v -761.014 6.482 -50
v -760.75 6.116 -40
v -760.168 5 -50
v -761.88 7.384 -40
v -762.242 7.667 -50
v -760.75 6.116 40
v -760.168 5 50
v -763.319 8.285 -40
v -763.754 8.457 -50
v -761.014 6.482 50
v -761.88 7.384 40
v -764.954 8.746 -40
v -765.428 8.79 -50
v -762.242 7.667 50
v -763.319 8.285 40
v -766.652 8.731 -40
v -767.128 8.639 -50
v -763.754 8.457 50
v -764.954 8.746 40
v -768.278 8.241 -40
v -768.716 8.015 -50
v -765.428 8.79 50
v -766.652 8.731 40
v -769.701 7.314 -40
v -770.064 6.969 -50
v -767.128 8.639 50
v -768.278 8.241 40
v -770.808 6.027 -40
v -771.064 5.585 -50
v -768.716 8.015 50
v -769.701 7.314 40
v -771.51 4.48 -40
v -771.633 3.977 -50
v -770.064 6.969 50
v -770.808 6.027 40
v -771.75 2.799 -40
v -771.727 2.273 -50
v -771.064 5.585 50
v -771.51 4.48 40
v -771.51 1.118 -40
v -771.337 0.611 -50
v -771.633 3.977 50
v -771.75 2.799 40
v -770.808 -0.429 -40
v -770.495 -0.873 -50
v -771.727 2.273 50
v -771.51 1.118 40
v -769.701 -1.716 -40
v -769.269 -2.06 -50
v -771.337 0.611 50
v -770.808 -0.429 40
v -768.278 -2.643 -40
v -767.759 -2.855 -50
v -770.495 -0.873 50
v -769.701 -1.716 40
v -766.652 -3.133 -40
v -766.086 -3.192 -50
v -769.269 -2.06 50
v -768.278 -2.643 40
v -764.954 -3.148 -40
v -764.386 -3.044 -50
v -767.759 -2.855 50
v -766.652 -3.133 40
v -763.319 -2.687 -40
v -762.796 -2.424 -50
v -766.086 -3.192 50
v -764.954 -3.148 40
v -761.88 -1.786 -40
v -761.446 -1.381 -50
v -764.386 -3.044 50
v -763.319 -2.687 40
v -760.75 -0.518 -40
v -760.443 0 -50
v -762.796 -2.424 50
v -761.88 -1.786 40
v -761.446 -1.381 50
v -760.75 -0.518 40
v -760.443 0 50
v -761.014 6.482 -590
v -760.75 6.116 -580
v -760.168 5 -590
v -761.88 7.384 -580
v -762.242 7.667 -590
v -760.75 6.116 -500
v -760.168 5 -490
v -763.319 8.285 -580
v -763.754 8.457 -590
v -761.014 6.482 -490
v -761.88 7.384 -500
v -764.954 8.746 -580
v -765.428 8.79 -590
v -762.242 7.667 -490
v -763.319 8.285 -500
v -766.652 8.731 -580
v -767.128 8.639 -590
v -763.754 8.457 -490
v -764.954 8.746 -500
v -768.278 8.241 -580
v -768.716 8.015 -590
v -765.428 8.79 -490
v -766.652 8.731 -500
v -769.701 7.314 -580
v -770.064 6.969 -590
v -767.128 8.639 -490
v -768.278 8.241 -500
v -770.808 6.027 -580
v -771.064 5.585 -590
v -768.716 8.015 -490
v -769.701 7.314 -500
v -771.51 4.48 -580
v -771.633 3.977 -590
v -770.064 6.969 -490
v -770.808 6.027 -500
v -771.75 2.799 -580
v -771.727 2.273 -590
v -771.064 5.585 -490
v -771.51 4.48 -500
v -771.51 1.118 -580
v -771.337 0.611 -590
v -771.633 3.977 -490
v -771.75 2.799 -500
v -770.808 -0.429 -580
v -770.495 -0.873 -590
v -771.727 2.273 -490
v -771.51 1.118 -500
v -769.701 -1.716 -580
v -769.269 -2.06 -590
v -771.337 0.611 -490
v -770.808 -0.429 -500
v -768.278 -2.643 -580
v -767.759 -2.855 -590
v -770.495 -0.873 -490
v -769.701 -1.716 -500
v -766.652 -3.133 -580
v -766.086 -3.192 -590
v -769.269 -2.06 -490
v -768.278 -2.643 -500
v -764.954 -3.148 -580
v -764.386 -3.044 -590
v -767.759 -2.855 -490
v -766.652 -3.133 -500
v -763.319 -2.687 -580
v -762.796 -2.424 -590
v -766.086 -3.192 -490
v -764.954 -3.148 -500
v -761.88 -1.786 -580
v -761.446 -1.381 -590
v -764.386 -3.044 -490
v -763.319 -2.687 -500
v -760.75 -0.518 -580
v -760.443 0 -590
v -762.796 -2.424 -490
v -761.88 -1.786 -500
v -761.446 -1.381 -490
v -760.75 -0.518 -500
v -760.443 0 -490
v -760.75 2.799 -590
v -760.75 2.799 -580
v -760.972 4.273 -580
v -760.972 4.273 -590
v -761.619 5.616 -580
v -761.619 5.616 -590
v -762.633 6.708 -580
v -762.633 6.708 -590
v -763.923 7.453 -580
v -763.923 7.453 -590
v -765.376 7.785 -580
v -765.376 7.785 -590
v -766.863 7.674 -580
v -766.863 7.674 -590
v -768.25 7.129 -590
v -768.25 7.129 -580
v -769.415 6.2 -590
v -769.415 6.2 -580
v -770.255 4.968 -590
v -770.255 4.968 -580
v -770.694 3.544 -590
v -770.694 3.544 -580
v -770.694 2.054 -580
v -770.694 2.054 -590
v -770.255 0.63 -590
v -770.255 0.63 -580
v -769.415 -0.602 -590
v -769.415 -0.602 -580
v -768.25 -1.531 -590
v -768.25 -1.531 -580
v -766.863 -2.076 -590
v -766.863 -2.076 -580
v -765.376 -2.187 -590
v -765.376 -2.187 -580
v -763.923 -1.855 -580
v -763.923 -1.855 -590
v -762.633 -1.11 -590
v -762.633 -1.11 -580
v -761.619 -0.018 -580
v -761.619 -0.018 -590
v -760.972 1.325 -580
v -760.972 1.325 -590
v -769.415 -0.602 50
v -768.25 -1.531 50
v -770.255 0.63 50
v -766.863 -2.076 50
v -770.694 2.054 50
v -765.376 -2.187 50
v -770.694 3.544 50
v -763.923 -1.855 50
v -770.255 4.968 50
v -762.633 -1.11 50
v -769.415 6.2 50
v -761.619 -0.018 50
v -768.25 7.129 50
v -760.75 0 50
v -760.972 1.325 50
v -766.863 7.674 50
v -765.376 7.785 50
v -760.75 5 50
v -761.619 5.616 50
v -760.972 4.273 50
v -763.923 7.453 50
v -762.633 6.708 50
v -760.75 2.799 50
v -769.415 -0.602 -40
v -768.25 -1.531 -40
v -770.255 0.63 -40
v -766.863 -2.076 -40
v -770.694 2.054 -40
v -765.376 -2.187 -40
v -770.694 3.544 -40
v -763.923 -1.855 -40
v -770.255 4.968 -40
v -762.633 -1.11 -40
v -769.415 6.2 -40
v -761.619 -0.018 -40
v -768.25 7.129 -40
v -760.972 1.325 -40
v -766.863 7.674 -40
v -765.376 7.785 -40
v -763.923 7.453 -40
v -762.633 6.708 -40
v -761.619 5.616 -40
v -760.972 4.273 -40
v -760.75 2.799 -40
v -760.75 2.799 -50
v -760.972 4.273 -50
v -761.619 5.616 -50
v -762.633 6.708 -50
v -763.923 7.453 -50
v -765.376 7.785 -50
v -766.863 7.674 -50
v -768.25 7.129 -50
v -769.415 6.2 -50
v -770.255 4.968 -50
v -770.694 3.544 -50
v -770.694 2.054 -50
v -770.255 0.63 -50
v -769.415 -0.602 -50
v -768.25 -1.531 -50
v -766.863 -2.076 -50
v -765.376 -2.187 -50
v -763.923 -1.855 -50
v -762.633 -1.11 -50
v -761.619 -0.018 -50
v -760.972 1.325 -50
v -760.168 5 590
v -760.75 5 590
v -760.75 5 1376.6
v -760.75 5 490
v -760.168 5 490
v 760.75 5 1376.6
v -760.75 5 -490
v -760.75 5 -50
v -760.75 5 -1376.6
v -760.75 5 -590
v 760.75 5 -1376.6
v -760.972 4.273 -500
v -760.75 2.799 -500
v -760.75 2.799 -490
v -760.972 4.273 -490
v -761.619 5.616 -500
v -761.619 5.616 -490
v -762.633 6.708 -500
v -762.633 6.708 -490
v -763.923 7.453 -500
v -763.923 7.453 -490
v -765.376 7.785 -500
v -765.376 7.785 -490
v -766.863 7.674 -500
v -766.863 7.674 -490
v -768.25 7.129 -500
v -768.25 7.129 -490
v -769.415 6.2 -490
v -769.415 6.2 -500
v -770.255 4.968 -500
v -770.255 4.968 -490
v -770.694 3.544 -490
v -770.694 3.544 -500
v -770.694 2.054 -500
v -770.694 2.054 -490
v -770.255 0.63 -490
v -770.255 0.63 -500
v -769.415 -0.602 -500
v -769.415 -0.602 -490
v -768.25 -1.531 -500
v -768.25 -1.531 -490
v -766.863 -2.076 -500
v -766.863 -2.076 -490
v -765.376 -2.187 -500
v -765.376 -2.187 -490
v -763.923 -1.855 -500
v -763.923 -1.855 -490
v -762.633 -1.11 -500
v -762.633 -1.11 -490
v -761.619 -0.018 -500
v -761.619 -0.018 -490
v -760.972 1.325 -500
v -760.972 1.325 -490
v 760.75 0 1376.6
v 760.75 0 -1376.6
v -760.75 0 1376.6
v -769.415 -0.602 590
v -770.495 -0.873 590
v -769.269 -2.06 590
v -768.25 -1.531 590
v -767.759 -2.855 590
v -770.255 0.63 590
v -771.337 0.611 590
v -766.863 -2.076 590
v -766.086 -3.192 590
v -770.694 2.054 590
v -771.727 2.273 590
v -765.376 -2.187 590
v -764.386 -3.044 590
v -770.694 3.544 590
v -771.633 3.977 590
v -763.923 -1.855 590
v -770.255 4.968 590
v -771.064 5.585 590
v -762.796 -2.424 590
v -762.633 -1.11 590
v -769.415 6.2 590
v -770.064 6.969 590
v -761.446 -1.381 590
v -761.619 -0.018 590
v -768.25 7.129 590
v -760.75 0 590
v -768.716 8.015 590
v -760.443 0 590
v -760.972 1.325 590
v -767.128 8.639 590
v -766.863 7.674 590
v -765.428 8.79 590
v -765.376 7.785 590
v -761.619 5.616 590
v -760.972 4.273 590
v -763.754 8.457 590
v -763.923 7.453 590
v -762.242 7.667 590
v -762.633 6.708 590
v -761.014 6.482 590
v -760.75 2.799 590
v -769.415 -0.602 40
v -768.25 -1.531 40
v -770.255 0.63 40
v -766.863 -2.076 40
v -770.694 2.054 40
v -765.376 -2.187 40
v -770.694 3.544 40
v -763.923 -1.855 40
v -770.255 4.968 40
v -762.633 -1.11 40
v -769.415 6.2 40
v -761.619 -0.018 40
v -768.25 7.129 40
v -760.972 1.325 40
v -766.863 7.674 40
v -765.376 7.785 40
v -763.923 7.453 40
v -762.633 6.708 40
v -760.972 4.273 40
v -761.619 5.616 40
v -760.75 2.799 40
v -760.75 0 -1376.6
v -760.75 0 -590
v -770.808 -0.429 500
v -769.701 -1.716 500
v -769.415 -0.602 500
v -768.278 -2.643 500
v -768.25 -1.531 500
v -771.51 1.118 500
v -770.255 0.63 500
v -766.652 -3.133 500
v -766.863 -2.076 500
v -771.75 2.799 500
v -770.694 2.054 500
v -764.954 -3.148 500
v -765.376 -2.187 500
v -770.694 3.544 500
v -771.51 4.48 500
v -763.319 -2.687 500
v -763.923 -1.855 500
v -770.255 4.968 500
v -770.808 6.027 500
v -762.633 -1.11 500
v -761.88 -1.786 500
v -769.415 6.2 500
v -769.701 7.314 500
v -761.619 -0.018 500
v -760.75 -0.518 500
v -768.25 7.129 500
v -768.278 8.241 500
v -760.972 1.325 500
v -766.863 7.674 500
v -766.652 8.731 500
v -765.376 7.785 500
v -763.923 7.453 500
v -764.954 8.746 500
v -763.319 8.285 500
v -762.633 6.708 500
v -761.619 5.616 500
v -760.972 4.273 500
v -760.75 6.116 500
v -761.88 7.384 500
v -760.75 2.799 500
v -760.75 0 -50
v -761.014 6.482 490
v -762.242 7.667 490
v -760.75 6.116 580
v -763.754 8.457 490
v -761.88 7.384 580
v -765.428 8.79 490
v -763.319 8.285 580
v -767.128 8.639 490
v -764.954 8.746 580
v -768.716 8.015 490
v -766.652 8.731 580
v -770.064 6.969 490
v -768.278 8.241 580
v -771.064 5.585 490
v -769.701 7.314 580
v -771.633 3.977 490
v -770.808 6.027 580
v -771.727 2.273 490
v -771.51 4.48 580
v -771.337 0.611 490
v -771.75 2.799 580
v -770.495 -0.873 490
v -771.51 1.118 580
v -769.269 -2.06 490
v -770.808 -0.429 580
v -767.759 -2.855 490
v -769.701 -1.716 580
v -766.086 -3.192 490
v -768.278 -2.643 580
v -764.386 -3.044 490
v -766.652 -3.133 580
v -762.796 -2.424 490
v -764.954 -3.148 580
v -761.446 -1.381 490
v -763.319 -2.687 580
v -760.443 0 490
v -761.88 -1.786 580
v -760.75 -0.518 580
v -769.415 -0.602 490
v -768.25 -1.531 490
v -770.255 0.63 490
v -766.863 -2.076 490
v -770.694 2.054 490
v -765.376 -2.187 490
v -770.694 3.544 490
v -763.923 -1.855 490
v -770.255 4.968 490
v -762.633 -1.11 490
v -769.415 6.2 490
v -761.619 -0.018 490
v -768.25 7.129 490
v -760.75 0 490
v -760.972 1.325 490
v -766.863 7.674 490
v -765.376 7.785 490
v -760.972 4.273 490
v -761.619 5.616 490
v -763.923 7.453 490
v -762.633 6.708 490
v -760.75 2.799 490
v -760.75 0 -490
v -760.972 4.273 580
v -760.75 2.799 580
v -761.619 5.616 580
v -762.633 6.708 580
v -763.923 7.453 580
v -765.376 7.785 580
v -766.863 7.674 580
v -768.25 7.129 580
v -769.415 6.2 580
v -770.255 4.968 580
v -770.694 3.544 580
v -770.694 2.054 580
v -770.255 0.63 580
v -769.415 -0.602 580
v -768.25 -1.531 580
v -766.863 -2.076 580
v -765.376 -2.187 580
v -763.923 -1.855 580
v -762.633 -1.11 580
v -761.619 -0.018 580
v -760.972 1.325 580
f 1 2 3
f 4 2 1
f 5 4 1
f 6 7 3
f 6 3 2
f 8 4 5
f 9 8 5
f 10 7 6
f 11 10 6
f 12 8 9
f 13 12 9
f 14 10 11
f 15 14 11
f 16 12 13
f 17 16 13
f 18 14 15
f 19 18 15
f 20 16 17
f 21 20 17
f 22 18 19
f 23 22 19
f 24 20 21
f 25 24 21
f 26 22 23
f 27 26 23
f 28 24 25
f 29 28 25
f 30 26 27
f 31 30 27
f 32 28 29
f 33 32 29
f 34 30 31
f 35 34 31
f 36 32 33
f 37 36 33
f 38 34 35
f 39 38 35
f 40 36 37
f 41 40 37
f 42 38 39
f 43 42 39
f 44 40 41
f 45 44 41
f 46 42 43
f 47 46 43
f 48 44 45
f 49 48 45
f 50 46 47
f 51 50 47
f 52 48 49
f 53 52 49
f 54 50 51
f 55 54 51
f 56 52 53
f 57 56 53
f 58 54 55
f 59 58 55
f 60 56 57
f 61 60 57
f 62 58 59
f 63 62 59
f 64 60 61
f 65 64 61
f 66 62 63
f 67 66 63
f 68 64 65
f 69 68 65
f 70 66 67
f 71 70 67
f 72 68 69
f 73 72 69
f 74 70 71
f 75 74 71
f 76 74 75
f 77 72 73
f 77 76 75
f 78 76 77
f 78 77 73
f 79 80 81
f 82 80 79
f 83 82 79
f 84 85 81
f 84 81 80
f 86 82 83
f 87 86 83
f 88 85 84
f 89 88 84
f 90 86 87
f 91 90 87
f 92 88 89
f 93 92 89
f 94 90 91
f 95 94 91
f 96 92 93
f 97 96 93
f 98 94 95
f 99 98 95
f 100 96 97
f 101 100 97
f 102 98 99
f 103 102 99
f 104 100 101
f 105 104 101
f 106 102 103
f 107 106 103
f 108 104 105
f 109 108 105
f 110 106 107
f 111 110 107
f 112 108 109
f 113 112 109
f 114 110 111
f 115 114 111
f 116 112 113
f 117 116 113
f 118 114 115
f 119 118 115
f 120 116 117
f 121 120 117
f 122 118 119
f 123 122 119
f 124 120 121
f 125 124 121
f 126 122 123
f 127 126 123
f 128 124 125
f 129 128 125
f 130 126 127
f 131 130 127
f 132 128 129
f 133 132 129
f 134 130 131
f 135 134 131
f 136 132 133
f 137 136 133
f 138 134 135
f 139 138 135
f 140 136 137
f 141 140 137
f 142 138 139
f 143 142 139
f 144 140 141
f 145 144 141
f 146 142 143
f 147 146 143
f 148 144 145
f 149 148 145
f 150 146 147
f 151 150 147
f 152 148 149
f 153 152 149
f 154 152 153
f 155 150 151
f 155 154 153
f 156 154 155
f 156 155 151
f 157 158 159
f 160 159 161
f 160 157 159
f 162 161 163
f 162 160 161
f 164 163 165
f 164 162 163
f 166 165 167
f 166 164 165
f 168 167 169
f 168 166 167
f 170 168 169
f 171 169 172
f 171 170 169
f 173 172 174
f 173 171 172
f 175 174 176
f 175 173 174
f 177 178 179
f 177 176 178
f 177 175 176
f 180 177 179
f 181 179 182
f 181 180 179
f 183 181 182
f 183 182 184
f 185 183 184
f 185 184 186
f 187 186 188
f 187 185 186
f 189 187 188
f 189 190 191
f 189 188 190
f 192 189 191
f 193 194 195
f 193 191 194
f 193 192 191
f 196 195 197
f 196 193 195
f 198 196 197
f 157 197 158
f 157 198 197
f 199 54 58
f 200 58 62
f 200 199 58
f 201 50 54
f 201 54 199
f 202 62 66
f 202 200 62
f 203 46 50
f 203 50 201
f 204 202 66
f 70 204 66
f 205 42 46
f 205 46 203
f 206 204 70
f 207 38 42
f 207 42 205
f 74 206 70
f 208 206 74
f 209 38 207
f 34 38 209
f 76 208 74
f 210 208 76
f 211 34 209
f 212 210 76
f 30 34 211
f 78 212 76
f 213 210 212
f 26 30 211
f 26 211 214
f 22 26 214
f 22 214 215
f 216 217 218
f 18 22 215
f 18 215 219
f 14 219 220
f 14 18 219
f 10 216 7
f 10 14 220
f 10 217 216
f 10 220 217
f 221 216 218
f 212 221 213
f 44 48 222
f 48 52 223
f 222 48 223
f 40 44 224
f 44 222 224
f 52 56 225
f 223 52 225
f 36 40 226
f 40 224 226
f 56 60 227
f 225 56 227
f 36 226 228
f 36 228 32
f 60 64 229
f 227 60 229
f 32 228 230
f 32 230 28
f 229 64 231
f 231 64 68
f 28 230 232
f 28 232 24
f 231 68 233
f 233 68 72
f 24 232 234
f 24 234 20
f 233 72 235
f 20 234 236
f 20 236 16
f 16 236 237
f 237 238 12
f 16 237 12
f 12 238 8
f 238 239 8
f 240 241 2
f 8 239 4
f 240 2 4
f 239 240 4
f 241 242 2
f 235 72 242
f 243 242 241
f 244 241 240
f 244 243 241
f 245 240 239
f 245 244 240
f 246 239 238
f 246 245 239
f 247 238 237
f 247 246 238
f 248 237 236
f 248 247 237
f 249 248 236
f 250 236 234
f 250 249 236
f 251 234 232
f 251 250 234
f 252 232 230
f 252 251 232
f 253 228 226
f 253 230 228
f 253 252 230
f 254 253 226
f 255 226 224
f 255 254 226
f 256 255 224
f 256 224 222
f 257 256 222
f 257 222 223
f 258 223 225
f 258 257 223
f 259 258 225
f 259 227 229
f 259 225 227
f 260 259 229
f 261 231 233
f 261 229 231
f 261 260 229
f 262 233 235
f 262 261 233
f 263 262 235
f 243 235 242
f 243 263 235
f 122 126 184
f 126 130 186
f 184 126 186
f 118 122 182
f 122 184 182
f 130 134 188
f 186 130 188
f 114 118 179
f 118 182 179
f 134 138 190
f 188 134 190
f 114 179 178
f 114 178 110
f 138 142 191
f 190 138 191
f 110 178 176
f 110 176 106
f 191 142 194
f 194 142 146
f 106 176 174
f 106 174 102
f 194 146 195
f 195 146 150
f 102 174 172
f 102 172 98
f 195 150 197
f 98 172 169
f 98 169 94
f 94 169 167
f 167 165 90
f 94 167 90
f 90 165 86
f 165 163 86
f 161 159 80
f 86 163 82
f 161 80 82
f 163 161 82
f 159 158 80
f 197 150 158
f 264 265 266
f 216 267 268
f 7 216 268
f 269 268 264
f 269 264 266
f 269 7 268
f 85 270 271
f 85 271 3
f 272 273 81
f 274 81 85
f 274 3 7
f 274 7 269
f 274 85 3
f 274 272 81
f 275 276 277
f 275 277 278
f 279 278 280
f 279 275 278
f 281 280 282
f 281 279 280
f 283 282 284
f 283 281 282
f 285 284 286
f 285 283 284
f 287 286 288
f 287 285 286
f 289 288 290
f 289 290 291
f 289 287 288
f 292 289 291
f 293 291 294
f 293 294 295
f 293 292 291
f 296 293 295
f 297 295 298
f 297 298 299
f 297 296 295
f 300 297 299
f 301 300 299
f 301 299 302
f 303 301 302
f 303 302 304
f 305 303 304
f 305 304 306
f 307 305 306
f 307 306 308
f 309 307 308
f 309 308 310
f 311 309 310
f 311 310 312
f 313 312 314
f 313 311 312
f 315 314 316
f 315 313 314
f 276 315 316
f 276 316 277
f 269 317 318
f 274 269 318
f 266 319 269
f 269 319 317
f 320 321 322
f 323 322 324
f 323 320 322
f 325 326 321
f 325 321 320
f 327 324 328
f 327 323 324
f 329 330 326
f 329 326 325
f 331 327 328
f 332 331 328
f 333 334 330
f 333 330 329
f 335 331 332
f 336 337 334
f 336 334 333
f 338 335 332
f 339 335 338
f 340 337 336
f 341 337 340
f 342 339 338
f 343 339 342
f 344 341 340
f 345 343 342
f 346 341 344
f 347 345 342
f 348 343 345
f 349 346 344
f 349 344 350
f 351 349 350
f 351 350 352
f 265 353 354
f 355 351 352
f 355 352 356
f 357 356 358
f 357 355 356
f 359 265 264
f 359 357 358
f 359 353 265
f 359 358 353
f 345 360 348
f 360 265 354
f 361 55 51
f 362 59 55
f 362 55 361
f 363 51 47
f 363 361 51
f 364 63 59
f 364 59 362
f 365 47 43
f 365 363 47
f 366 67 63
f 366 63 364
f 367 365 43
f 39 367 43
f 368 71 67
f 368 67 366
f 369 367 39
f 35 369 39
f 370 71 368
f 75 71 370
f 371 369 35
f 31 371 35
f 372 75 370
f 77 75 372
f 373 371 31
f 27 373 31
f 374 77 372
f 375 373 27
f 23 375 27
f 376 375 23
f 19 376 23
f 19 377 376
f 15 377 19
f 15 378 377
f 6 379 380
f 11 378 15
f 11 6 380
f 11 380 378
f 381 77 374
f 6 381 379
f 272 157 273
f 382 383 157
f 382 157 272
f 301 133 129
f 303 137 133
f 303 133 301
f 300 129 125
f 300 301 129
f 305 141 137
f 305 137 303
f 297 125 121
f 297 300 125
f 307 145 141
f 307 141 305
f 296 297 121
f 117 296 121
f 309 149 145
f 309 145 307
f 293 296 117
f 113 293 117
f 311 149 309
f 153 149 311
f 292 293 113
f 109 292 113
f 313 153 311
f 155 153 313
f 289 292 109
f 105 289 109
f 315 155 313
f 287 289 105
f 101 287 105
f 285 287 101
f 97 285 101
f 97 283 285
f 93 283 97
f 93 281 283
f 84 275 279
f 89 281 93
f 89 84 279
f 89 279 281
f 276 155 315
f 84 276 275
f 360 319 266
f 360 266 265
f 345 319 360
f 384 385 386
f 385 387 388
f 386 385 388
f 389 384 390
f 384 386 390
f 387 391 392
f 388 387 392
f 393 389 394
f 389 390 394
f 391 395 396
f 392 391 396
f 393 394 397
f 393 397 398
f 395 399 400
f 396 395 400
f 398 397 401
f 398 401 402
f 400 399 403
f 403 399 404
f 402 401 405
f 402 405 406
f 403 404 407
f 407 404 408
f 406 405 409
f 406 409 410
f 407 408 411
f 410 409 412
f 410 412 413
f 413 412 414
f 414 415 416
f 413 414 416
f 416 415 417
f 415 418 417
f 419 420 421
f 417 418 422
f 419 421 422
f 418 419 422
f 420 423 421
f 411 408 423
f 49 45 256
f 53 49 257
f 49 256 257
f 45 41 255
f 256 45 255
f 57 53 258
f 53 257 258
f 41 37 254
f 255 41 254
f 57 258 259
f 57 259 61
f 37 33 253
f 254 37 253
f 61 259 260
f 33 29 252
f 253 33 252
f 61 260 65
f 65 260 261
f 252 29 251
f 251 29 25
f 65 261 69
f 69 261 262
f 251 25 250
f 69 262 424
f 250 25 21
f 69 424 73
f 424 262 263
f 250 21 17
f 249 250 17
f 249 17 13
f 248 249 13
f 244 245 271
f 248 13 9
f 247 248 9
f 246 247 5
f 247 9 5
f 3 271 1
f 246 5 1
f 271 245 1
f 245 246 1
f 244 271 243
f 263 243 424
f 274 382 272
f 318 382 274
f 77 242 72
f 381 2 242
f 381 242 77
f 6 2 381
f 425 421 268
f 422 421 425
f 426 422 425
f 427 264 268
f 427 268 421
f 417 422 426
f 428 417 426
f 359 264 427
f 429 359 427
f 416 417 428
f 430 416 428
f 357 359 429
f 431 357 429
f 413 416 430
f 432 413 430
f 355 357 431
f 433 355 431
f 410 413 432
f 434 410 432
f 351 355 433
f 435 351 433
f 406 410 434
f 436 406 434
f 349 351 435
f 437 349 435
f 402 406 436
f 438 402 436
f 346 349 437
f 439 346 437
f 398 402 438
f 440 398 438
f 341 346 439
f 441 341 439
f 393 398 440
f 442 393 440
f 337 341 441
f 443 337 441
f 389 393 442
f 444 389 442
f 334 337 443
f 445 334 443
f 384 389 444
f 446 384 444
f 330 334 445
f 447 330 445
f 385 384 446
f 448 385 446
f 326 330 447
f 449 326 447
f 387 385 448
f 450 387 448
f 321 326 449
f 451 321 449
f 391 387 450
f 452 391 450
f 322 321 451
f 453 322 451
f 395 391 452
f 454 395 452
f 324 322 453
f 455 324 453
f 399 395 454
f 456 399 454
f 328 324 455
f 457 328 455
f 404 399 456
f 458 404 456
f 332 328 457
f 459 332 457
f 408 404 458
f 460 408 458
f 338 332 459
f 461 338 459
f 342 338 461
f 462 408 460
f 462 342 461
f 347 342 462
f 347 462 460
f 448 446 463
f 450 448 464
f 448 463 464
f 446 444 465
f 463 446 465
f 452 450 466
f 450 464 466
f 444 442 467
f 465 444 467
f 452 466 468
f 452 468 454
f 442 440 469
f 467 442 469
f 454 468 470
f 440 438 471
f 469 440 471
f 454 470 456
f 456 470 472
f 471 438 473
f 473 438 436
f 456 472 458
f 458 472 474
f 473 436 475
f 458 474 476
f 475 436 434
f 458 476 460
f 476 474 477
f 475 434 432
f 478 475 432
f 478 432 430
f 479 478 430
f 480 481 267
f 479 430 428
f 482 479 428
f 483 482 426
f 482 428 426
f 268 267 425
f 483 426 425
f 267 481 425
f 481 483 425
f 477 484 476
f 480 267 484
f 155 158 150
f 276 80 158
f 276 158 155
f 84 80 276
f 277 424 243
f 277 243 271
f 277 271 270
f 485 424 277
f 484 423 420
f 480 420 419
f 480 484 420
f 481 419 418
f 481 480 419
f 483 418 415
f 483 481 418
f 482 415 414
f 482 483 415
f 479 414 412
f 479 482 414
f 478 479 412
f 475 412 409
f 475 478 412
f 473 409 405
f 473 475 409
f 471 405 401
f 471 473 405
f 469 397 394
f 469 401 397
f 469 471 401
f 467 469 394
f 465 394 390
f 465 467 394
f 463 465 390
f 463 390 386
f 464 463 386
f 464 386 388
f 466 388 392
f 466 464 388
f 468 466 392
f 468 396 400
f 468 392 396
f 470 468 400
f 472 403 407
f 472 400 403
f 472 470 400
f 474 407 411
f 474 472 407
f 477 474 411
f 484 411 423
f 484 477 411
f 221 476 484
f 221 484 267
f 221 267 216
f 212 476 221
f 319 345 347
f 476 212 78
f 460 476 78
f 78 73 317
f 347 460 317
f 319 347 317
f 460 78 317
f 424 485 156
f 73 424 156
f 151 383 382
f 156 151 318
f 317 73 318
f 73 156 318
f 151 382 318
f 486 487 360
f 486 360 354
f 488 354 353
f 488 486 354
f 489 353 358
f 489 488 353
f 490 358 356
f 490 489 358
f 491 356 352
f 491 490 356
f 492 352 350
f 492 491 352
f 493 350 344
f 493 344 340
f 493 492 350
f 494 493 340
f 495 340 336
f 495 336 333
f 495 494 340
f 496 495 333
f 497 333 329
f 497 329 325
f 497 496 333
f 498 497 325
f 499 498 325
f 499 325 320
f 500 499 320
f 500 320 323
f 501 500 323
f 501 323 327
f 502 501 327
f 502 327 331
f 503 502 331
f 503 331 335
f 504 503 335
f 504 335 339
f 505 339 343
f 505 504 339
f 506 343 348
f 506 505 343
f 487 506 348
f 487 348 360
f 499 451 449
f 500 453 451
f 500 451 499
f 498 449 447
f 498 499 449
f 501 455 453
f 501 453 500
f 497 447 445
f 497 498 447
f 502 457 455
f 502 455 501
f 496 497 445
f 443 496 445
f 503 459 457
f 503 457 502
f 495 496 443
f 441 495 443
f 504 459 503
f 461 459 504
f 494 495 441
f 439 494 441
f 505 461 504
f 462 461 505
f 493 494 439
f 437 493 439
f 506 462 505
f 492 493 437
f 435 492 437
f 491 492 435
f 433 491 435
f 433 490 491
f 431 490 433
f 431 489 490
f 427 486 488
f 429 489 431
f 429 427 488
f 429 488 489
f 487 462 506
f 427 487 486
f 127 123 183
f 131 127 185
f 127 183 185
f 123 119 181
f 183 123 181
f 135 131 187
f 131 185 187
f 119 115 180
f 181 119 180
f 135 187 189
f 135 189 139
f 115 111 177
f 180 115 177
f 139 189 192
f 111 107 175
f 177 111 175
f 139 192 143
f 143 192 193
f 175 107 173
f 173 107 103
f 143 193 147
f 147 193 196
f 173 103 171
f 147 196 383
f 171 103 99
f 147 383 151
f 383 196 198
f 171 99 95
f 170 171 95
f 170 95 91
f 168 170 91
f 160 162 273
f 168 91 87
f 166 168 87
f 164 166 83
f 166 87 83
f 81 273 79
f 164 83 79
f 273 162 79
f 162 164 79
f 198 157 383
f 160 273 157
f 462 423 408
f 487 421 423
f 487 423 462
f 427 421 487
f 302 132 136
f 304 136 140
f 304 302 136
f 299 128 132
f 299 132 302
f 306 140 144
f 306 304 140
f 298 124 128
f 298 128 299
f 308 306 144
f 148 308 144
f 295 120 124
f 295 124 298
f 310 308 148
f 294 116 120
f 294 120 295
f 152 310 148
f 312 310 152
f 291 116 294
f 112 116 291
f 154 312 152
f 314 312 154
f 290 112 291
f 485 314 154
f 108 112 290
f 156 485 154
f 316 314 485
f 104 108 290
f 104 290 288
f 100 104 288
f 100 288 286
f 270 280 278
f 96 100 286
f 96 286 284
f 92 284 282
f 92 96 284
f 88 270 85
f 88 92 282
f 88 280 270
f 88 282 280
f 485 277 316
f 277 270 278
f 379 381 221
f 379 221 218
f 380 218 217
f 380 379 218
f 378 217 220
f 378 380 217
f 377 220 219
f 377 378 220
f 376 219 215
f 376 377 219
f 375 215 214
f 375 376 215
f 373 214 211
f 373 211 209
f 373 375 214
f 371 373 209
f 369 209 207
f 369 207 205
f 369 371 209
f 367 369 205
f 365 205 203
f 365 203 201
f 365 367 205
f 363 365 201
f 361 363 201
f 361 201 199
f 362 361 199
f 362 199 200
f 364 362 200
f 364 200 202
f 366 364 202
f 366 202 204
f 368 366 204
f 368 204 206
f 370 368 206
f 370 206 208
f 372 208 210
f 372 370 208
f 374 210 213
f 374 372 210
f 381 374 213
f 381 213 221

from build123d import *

# Parameters (mm, degrees)
SKETCH1_W                   = 1521.5
SKETCH1_H                   = 2753.2
BOSS_EXTRUDE1_DEPTH         = 5
SKETCH4_R                   = 6
SKETCH4_R_2                 = 5
BOSS_EXTRUDE3_DEPTH         = 50
SKETCH5_W                   = 80
SKETCH5_H                   = 12
CUT_EXTRUDE1_DEPTH          = 12
LPATTERN1_COUNT             = 2
LPATTERN1_PITCH             = 540
LPATTERN2_COUNT             = 2
LPATTERN2_PITCH             = 540
LPATTERN2_COPY_1_SKETCH_R   = 6
LPATTERN2_COPY_1_SKETCH_R_2 = 5
LPATTERN2_COPY_1_DEPTH      = 50
LPATTERN2_COPY_2_SKETCH_W   = 80
LPATTERN2_COPY_2_SKETCH_H   = 12
LPATTERN2_COPY_2_DEPTH      = 12


with BuildPart() as part:
    # Sketch1 → Boss-Extrude1 (new body)
    with BuildSketch(Plane(origin=(0, 0, 0), x_dir=(1, 0, 0), z_dir=(0, 1, 0))):
        Rectangle(SKETCH1_W, SKETCH1_H)
    extrude(amount=BOSS_EXTRUDE1_DEPTH)

    # Sketch4 → Boss-Extrude3 (add, symmetric)
    with BuildSketch(Plane.XY):
        with Locations((-765.75, 2.799008647)):
            Circle(SKETCH4_R)
        with Locations((-765.75, 2.799008647)):
            Circle(SKETCH4_R_2, mode=Mode.SUBTRACT)
    boss_extrude3 = extrude(amount=BOSS_EXTRUDE3_DEPTH, both=True)

    # Sketch5 → Cut-Extrude1 (cut)
    with BuildSketch(Plane.ZY.offset(760.75)):
        with Locations((0, 2.799008647)):
            Rectangle(SKETCH5_W, SKETCH5_H)
    cut_extrude1 = extrude(amount=CUT_EXTRUDE1_DEPTH, mode=Mode.SUBTRACT)

    # LPattern1: Boss-Extrude3, Cut-Extrude1 ×2
    with Locations(*[(0, 0, -i * LPATTERN1_PITCH) for i in range(1, LPATTERN1_COUNT)]):
        add(boss_extrude3)
        add(cut_extrude1, mode=Mode.SUBTRACT)

    # LPattern2: Boss-Extrude3, Cut-Extrude1 ×2
    with Locations(*[(0, 0, i * LPATTERN2_PITCH) for i in range(1, LPATTERN2_COUNT)]):
        add(boss_extrude3)
        add(cut_extrude1, mode=Mode.SUBTRACT)

    # LPattern2 copy 1 sketch → LPattern2 copy 1 (add, symmetric)
    with BuildSketch(Plane.XY):
        with Locations((-765.75, 2.799008647)):
            Circle(LPATTERN2_COPY_1_SKETCH_R)
        with Locations((-765.75, 2.799008647)):
            Circle(LPATTERN2_COPY_1_SKETCH_R_2, mode=Mode.SUBTRACT)
    extrude(amount=LPATTERN2_COPY_1_DEPTH, both=True)

    # LPattern2 copy 2 sketch → LPattern2 copy 2 (cut)
    with BuildSketch(Plane.ZY.offset(760.75)):
        with Locations((0, 2.799008647)):
            Rectangle(LPATTERN2_COPY_2_SKETCH_W, LPATTERN2_COPY_2_SKETCH_H)
    extrude(amount=LPATTERN2_COPY_2_DEPTH, mode=Mode.SUBTRACT)


solid = part.part
